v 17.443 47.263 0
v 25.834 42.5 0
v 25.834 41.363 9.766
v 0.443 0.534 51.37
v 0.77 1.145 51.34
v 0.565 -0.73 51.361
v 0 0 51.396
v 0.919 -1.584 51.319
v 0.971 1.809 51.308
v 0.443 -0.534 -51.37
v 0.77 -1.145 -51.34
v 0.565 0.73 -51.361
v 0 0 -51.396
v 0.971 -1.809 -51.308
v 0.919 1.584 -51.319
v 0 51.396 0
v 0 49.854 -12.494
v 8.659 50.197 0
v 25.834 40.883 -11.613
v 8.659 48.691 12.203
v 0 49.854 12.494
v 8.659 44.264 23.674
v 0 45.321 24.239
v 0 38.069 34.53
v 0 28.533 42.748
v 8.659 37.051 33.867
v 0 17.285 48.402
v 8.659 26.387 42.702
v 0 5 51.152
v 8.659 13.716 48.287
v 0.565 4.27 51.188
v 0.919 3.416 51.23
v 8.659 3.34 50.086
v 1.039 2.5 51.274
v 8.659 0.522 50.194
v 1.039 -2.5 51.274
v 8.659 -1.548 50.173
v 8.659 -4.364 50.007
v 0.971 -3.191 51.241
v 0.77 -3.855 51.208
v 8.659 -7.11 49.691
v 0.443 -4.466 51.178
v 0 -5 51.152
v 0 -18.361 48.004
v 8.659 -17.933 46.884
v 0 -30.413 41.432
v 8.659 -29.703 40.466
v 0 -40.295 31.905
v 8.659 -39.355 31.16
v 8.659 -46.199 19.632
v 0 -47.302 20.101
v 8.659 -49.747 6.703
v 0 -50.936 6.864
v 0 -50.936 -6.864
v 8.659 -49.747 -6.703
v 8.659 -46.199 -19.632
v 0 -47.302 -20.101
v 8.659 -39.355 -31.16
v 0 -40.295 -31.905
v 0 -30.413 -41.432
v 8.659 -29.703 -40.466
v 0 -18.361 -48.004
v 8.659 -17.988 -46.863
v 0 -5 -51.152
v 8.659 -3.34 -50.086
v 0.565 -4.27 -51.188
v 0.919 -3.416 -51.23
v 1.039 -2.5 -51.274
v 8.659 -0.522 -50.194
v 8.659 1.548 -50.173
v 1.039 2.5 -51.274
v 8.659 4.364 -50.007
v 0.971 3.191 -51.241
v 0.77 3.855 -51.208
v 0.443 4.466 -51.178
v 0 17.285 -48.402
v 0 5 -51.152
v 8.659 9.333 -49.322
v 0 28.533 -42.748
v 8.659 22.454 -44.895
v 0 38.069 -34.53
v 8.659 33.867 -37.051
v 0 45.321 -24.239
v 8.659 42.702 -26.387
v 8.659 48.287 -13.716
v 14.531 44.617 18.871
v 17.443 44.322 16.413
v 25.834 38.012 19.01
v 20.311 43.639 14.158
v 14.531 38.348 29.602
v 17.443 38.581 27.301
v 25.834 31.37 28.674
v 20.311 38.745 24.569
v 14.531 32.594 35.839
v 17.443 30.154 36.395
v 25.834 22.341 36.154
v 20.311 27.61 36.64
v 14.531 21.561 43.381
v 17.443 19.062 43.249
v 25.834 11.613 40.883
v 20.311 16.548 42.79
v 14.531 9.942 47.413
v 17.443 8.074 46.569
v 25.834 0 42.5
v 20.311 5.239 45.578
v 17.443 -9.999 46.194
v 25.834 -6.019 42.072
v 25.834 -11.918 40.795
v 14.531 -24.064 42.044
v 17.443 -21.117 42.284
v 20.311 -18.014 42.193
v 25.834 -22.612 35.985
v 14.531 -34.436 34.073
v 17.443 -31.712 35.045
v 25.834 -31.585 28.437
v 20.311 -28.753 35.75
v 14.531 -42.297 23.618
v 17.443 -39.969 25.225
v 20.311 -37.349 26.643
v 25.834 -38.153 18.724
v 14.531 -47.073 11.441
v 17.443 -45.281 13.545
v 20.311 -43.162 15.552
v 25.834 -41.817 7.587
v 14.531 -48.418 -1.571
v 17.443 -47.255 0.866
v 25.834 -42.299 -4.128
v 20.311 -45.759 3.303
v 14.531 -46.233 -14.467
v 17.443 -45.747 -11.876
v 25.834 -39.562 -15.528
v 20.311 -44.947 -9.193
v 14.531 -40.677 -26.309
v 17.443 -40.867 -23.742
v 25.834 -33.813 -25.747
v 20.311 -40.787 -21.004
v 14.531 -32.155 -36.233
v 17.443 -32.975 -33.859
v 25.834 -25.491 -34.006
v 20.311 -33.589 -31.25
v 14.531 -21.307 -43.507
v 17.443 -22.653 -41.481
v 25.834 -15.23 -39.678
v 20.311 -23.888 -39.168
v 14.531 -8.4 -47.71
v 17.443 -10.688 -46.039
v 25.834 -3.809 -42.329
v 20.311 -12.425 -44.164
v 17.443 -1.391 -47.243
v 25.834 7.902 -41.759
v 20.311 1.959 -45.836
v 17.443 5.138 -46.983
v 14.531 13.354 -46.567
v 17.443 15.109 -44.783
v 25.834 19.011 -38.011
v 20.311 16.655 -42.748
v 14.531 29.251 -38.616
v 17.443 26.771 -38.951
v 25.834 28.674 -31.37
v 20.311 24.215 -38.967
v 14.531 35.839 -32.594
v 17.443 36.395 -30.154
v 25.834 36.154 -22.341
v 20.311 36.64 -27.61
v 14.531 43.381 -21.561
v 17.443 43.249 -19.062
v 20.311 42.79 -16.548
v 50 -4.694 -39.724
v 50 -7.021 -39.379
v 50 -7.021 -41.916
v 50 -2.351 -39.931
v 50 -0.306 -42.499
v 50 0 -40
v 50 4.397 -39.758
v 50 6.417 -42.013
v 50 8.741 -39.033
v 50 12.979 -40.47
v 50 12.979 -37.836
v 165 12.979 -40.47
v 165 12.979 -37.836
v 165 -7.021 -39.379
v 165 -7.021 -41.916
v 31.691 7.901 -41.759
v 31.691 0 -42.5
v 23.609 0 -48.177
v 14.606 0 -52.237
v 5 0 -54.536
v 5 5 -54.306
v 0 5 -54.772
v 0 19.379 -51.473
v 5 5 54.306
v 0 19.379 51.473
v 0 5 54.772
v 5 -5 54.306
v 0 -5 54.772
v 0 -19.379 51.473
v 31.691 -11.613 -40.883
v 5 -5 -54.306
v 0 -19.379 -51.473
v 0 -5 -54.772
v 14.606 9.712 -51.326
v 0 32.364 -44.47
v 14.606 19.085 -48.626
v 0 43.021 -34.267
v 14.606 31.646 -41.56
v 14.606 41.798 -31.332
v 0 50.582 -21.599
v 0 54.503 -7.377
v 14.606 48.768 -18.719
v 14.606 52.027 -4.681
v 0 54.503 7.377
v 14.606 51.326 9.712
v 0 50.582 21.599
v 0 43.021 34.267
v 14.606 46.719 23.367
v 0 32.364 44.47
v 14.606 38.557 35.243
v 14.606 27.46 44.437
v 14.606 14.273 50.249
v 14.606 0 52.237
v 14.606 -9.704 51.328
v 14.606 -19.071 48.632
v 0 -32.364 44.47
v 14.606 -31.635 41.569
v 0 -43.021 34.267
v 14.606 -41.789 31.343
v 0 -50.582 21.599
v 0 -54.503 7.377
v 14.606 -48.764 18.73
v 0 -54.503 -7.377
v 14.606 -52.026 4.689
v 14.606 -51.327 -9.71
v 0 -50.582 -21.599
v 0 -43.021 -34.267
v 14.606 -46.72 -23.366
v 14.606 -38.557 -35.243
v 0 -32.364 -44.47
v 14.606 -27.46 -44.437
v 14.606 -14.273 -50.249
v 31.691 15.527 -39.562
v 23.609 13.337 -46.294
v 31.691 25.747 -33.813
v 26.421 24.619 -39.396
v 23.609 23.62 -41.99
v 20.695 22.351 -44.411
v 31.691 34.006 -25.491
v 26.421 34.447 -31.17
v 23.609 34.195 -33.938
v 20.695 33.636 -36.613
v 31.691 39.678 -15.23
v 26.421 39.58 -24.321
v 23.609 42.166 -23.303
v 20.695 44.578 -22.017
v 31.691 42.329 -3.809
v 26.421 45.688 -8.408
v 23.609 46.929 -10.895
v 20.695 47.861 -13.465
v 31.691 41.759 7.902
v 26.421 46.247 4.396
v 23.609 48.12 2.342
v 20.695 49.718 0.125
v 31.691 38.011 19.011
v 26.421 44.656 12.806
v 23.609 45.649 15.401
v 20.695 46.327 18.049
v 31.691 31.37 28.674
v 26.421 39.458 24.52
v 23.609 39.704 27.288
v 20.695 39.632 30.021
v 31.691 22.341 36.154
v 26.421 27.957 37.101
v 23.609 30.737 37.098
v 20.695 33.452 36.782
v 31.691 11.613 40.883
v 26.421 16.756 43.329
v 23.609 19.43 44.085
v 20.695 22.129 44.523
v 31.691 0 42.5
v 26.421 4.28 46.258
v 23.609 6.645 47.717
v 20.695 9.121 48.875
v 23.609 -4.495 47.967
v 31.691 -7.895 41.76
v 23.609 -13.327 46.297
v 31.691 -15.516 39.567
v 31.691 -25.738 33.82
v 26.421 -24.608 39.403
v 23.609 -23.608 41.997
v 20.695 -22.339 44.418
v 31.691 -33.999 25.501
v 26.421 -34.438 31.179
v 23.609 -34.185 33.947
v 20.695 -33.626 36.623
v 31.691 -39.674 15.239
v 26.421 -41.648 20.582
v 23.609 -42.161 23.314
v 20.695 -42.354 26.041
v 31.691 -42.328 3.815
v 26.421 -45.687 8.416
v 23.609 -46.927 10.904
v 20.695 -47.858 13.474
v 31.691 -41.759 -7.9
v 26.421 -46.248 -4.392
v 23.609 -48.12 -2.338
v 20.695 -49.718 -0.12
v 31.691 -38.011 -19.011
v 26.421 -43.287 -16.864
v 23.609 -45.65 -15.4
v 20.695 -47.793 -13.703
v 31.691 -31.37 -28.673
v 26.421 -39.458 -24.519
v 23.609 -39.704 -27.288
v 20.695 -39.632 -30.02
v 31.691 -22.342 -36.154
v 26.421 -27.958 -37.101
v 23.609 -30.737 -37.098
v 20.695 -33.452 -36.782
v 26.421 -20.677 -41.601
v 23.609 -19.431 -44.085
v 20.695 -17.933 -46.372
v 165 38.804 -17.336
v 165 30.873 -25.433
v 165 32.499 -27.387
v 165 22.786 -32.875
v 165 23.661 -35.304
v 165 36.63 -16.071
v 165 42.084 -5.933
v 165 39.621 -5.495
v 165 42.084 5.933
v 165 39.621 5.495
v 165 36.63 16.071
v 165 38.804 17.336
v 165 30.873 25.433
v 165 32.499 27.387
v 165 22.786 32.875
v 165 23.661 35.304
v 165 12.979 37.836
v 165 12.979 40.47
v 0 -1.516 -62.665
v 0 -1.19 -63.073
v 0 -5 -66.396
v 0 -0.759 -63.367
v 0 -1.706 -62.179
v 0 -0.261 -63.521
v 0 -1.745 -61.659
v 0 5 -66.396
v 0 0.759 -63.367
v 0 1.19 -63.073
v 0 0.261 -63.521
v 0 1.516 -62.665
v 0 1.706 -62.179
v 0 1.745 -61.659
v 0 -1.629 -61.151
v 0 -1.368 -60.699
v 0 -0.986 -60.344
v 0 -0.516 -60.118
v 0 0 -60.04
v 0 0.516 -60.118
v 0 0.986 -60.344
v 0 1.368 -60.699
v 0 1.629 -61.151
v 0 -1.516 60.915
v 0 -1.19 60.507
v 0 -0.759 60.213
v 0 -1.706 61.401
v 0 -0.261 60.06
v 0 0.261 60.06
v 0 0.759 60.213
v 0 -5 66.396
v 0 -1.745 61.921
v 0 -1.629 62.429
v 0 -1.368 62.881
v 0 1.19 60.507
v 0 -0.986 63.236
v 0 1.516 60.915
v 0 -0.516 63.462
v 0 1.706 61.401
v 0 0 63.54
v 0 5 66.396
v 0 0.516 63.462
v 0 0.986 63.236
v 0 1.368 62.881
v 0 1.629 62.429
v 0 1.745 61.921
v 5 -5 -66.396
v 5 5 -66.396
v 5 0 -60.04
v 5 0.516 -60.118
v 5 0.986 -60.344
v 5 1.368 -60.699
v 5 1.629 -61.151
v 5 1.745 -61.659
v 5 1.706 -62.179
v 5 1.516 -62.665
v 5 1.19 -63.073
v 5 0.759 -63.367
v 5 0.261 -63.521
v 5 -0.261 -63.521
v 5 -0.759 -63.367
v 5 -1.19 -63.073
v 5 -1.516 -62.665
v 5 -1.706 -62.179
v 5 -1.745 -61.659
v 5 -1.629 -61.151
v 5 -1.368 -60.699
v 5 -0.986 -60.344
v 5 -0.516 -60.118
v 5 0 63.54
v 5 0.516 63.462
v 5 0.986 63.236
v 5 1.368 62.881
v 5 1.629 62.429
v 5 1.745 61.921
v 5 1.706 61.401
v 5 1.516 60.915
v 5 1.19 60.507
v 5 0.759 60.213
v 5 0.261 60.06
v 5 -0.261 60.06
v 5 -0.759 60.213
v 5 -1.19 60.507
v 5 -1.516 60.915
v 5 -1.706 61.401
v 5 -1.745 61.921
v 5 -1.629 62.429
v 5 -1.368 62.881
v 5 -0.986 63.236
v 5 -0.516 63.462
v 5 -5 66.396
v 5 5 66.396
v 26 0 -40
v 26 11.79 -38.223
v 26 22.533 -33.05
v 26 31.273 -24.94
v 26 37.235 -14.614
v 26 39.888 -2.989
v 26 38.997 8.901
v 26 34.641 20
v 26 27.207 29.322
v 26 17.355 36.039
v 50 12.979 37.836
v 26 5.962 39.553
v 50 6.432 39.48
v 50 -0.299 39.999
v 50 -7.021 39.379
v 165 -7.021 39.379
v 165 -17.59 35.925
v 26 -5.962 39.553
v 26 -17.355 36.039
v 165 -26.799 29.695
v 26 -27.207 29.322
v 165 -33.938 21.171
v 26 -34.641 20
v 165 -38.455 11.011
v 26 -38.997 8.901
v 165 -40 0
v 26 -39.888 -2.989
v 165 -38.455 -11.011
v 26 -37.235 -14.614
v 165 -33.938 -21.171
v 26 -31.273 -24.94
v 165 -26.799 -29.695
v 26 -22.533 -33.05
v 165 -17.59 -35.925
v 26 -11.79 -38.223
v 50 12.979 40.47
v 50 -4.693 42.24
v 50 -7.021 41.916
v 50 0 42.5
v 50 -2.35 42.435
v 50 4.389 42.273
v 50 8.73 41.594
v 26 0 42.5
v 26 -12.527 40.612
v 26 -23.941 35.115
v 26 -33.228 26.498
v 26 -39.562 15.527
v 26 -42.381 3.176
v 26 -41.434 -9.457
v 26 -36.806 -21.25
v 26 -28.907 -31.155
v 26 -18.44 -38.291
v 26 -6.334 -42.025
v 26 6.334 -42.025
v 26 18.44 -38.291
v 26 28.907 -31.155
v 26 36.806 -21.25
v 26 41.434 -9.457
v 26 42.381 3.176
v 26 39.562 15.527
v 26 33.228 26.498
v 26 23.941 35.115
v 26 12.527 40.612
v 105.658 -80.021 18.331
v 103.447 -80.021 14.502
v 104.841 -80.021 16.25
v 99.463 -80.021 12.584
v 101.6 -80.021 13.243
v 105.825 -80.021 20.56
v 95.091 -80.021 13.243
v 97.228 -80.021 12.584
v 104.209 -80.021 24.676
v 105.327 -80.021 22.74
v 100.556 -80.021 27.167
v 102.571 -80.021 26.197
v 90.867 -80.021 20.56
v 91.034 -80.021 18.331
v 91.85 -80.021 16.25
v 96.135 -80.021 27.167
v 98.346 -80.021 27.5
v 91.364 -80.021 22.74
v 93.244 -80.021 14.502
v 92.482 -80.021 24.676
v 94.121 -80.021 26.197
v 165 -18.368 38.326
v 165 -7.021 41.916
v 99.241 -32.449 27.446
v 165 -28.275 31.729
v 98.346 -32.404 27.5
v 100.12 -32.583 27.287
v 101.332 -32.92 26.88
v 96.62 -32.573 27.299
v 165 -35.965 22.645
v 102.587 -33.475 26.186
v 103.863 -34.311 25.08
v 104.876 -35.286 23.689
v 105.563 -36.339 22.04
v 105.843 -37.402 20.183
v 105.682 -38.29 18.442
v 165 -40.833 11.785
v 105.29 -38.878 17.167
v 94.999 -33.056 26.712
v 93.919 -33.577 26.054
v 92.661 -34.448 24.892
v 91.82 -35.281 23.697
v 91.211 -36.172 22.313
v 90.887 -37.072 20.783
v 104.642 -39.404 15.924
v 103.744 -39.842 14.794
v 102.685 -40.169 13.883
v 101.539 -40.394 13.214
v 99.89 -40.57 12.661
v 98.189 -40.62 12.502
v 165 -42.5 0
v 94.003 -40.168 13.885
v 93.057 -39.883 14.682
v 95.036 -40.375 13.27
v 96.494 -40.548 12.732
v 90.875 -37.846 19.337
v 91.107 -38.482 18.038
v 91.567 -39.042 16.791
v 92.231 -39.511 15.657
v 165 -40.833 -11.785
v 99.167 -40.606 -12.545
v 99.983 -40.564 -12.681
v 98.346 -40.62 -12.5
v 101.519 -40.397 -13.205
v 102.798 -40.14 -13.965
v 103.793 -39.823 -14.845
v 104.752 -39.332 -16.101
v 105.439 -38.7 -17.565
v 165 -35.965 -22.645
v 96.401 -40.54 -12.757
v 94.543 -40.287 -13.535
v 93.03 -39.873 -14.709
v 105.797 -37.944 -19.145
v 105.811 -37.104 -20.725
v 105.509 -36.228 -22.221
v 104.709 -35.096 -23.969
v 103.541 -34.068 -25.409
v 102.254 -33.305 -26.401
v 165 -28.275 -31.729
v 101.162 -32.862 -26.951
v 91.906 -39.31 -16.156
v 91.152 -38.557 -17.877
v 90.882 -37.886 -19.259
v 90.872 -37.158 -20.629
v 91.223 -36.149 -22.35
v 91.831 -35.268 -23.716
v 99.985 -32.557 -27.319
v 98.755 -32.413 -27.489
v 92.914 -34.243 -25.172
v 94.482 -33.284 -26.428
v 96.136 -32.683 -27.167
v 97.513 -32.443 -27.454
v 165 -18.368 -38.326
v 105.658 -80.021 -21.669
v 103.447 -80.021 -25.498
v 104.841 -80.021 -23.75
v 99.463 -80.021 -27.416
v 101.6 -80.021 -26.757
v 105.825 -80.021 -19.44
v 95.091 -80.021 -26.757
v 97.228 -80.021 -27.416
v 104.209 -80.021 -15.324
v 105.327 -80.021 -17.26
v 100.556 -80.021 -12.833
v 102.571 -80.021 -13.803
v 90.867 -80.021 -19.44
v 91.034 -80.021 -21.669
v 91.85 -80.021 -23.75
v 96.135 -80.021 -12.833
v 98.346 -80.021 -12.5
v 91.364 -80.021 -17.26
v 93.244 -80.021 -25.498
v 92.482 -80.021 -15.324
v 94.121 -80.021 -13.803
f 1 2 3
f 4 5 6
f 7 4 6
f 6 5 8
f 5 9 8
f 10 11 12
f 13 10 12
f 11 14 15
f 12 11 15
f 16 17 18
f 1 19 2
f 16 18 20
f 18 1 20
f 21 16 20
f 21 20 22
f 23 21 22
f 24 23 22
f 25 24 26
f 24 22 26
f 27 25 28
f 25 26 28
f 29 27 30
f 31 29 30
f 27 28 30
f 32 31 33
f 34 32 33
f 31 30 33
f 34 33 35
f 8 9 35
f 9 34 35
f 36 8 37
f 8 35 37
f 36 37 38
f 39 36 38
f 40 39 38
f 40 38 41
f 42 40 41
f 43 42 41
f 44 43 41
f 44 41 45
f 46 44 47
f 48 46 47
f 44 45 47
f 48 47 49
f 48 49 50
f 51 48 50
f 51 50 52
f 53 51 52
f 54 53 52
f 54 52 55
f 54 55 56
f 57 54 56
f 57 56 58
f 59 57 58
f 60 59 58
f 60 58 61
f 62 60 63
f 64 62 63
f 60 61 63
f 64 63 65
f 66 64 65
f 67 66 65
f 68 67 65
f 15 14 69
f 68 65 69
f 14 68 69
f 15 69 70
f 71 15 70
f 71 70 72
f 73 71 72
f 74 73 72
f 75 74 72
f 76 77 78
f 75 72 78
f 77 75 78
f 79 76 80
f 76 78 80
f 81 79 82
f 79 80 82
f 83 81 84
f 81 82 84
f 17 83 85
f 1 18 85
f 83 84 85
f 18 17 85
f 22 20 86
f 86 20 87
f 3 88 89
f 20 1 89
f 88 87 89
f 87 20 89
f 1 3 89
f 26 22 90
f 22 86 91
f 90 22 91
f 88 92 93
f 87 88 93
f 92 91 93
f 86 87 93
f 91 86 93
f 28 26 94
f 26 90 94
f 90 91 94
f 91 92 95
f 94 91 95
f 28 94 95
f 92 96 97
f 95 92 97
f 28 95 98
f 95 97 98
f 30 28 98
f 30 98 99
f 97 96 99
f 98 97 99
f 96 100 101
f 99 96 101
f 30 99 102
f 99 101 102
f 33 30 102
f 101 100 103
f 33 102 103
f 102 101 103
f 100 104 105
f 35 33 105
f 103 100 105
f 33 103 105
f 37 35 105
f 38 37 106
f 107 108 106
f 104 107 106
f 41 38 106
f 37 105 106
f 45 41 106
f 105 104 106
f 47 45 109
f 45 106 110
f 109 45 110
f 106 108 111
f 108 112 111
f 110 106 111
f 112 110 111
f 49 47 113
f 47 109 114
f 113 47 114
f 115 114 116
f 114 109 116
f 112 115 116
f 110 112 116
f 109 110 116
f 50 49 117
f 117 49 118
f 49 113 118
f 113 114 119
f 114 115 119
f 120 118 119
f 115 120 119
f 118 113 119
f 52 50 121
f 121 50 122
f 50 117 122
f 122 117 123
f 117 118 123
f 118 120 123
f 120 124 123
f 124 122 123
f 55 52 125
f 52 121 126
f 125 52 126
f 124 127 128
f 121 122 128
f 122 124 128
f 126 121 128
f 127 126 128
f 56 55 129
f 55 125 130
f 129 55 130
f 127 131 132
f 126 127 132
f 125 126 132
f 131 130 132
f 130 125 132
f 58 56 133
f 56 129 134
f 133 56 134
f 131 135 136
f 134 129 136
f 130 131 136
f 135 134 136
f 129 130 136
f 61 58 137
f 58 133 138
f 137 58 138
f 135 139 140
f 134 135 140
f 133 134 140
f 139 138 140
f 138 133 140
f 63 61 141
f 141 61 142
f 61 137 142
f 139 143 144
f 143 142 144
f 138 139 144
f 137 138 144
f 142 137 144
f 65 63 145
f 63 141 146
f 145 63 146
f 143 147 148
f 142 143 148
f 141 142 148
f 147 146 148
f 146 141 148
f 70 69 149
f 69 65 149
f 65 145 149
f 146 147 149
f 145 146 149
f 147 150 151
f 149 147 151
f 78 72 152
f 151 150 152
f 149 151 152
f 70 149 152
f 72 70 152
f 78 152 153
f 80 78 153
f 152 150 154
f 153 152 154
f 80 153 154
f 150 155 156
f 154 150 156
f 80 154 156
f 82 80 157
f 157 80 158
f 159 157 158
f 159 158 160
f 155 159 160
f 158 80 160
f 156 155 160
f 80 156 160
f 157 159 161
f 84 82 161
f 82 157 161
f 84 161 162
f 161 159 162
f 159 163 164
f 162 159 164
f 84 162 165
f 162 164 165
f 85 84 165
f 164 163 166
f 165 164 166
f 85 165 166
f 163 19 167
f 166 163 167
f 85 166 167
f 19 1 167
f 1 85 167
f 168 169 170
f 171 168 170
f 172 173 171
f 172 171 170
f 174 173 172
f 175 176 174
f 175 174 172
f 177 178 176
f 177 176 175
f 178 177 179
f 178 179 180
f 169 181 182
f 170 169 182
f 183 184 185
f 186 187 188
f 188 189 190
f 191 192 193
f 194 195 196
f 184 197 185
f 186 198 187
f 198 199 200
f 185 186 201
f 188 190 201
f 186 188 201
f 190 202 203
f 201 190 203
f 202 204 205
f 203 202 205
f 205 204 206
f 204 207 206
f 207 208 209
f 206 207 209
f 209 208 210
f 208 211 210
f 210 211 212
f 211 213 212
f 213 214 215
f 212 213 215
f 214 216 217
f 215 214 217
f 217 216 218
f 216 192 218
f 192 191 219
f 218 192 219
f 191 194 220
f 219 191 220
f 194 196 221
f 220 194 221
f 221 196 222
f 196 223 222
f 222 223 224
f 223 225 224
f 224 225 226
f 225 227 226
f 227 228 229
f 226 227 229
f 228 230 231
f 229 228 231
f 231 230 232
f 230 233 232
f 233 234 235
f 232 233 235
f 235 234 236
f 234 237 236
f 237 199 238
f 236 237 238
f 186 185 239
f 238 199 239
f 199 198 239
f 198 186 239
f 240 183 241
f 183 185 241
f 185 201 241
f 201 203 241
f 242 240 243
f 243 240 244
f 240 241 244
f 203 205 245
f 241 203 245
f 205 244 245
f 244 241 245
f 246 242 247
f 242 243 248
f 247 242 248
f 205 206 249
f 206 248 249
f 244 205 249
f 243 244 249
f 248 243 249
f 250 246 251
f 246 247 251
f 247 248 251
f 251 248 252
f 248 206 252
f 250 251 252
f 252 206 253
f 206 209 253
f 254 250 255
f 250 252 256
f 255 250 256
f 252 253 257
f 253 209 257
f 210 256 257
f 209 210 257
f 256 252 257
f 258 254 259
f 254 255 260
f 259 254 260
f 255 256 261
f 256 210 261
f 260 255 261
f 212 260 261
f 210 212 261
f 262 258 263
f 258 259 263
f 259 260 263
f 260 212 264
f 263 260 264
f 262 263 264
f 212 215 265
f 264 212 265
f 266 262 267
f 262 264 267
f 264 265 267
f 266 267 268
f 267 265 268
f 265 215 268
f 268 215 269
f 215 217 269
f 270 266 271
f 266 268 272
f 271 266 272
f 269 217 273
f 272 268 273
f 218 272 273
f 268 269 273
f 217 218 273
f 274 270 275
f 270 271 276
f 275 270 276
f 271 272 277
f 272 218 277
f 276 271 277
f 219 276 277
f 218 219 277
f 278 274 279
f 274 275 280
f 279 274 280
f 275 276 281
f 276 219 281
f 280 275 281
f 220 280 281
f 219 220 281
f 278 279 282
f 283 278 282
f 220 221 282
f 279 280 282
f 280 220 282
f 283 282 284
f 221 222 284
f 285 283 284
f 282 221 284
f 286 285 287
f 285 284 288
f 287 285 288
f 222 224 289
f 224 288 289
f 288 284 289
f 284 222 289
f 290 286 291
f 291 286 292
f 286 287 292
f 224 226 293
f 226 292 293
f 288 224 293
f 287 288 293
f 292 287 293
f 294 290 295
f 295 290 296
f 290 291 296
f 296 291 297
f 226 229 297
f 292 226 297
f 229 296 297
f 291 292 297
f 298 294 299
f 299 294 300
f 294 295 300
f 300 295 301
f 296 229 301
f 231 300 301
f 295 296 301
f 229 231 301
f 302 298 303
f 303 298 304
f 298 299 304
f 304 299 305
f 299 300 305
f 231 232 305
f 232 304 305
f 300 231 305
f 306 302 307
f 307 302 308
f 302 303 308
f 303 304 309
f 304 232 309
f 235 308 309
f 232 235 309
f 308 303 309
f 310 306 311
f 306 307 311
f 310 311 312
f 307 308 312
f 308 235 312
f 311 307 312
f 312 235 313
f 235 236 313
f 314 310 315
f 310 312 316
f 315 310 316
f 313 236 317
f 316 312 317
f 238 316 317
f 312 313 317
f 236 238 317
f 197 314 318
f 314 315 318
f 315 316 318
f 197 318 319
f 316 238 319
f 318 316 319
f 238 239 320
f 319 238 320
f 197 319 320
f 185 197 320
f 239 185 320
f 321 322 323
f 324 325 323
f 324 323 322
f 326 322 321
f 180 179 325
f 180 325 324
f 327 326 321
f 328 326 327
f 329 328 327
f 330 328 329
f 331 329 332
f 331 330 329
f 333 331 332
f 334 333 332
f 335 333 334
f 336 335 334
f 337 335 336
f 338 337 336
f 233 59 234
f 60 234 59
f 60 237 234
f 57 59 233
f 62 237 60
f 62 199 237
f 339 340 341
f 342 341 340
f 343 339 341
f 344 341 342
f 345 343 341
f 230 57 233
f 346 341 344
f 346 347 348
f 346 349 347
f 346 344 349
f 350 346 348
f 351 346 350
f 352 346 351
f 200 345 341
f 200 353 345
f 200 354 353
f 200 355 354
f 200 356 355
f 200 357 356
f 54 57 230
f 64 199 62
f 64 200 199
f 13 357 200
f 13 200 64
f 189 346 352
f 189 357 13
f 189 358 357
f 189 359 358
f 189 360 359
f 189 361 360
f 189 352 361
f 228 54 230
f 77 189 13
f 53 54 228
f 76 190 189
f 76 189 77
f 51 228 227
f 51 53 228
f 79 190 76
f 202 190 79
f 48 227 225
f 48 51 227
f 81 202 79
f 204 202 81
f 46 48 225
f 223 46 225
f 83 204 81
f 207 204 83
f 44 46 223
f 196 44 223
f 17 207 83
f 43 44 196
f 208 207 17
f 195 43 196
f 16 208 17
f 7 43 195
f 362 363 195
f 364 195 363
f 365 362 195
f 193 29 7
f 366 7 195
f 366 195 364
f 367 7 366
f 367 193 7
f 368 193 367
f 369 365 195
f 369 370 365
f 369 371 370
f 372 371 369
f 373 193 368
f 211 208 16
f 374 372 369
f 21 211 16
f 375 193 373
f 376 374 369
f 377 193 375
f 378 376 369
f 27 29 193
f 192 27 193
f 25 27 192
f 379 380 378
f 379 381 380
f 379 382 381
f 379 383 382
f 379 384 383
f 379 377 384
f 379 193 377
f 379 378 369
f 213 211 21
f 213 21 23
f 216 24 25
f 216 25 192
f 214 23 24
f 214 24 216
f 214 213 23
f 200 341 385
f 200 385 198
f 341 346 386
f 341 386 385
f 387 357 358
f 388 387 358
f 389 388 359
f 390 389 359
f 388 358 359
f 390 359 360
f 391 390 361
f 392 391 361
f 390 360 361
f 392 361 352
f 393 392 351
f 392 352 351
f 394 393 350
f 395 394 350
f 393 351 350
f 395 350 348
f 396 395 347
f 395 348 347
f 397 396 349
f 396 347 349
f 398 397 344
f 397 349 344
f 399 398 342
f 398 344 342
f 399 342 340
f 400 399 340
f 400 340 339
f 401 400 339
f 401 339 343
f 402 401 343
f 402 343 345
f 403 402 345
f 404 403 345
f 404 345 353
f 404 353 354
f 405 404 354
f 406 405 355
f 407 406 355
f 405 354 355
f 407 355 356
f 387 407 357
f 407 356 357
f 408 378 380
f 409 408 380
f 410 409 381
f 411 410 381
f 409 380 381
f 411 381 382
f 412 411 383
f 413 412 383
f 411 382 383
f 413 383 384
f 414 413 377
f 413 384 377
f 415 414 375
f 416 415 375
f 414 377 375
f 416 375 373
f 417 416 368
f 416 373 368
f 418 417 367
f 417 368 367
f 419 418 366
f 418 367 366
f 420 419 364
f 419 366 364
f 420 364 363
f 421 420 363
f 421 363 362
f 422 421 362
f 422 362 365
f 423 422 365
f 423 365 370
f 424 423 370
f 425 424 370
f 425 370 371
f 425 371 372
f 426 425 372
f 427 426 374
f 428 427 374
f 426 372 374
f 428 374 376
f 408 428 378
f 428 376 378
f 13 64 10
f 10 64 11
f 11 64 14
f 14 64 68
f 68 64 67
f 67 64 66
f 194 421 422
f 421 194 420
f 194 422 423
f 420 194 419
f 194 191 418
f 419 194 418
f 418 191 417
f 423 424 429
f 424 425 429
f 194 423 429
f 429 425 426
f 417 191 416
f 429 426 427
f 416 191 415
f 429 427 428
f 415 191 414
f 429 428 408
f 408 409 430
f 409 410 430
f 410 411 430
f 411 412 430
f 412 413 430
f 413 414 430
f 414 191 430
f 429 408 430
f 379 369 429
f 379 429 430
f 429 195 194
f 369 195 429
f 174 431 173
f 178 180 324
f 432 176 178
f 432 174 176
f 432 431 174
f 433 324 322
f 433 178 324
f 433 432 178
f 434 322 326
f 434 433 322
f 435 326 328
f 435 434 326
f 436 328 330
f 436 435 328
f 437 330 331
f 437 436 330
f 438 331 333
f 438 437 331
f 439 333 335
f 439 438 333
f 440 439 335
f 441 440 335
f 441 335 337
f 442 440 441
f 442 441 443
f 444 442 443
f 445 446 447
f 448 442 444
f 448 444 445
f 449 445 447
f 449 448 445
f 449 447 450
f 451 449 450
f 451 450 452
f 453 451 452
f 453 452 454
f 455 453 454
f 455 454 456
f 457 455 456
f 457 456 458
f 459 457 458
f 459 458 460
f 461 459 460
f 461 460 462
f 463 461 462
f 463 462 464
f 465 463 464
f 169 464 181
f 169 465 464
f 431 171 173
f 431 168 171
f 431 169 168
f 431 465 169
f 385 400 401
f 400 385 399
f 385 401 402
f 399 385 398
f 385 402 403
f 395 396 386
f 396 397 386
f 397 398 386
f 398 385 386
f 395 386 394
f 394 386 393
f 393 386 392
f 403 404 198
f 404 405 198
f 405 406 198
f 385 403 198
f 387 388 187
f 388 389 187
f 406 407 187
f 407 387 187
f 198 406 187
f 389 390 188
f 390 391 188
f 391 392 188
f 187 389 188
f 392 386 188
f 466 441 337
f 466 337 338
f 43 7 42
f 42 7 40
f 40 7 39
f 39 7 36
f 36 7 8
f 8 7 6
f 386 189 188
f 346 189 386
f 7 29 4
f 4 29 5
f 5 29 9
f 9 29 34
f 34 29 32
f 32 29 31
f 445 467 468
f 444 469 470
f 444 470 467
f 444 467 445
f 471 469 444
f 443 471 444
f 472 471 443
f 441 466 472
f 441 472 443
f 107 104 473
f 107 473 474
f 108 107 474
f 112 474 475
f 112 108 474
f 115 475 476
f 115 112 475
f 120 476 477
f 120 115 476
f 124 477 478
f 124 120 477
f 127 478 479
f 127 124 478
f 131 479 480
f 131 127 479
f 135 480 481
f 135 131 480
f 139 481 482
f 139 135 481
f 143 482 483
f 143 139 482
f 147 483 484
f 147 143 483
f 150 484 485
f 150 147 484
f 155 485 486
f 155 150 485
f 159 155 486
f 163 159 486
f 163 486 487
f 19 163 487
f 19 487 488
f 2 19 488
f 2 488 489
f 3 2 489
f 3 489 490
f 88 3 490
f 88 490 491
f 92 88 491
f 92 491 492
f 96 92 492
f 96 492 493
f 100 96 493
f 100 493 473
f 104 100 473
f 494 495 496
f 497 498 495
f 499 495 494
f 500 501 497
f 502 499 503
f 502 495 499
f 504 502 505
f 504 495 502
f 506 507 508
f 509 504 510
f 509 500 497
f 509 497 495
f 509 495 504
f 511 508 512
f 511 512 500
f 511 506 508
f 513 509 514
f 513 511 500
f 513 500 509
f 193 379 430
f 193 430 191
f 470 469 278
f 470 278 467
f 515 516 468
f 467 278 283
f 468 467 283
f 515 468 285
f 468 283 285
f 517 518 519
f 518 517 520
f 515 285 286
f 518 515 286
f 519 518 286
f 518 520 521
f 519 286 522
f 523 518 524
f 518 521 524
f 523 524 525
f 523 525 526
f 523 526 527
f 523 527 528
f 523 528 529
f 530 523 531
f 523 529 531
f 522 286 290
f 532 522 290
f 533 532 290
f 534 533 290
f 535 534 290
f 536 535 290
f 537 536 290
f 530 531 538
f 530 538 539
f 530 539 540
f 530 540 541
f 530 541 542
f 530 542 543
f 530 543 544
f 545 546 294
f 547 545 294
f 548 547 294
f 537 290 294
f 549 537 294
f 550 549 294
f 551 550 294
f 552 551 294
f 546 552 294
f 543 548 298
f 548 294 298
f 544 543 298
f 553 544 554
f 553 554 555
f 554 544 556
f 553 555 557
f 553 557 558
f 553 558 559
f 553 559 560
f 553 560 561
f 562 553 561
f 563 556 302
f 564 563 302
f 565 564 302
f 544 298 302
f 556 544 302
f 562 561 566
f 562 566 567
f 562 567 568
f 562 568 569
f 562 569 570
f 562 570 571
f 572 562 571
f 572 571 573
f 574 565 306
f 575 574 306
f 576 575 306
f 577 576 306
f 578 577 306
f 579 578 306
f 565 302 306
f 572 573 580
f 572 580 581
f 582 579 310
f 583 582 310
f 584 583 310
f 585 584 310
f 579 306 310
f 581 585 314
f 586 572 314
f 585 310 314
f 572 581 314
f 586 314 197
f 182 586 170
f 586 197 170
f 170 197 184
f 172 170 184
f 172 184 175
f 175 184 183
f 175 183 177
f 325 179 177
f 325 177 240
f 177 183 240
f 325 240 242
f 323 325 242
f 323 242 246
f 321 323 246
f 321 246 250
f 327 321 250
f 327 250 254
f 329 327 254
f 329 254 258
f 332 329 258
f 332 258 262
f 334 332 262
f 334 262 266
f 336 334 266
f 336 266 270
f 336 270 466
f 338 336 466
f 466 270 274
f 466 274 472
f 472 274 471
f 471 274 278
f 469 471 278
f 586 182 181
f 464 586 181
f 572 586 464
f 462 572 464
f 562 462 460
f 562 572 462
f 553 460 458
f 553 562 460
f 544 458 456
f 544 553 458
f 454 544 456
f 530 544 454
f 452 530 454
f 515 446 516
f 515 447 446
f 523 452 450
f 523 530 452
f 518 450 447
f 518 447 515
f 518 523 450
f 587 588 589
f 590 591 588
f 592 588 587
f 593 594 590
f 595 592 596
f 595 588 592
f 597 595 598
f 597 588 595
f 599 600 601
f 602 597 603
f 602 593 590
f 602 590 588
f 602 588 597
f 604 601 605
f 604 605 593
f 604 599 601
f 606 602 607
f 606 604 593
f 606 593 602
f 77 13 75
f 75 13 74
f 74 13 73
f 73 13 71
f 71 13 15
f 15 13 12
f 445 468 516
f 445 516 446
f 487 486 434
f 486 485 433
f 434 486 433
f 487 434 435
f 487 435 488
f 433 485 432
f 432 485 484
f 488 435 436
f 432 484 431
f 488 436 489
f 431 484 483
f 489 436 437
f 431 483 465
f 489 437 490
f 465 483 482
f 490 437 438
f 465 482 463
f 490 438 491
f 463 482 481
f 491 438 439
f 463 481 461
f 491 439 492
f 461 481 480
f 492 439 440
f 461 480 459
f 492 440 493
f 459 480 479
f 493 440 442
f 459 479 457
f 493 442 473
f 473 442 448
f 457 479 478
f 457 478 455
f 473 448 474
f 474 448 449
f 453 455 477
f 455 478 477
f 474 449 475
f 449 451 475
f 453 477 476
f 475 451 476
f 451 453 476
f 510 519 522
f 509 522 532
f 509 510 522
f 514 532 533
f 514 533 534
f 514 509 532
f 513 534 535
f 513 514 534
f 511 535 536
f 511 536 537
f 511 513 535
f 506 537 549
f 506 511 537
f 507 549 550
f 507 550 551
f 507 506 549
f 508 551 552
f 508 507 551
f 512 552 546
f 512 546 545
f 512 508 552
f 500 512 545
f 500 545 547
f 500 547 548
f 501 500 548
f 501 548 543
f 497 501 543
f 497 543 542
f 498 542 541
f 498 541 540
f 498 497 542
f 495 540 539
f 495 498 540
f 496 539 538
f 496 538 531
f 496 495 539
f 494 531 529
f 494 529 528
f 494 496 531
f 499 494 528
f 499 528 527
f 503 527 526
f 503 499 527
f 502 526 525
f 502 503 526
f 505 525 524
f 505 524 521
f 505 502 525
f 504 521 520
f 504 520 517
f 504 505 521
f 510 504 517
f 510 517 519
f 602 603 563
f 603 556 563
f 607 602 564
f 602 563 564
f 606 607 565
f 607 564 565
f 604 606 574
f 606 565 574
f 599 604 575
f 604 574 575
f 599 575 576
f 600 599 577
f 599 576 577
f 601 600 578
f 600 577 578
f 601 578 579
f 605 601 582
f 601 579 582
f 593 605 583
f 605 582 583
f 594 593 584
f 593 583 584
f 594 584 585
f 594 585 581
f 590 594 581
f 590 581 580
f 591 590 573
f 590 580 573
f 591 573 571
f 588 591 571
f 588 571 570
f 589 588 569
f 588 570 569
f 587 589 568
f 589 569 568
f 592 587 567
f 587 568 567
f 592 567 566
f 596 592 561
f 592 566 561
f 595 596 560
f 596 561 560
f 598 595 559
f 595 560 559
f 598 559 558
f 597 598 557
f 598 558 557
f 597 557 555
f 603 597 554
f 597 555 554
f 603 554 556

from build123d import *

# Parameters (mm, degrees)
CUT_EXTRUDE1_DEPTH              = 85
CUT_EXTRUDE1_DEPTH_BACK         = 30
SKETCH2_R                       = 42.5
BOSS_EXTRUDE1_DEPTH             = 135
BOSS_EXTRUDE1_DEPTH_BACK        = 4
SKETCH3_R                       = 42.5
SKETCH3_R_2                     = 40
CUT_EXTRUDE2_START              = -115
CUT_EXTRUDE2_DEPTH              = 115
BOSS_EXTRUDE3_REACH             = 208.879
BOSS_EXTRUDE3_END_RADIUS        = 42.5
SKETCH7_R                       = 7.5
BOSS_EXTRUDE3_DIRECTION_2_DEPTH = 23
SKETCH8_R                       = 1.75
BOSS_EXTRUDE4_DEPTH             = 5


# Read off the part's stored shape, not the designer's step: Shell1
with BuildPart() as part:
    # Sketch1 → Revolve1 (revolve)
    with BuildSketch(Plane(origin=(0, 0, 0), x_dir=(1, 0, 0), z_dir=(0, 1, 0))):
        with BuildLine():
            Line((0, 0), (50, 0))
            ThreePointArc((50, 0), (36.43816018, 37.898327436), (0, 55))
            Line((0, 55), (0, 0))
        make_face()
    revolve(axis=Axis((0, 0, 0), (1, 0, 0)))

    # Shell1 outline → Shell1 (revolve, cut)
    with BuildSketch(Plane.YX):
        with BuildLine():
            add(Edge.make_bspline(
                [(51.396143239, 0), (50.757559449, 13.308797838), (45.305252471, 29.157669604), (32.638691052, 41.565710517), (16.262834021, 46.466854434), (2.111028419, 46.466854274), (1.578625505, 46.459517426), (1.049215582, 46.444998454), (0.522958084, 46.423458206), (0, 46.395061716)],
                knots=[4.717788708, 4.717788708, 4.717788708, 4.717788708, 4.717788708, 4.717788708, 6.23524, 6.23524, 6.23524, 6.23524, 6.294886198, 6.294886198, 6.294886198, 6.294886198, 6.294886198, 6.294886198], degree=5, weights=[1, 1, 0.970217445, 0.968892719, 1, 1, 1.000000024, 1.000000027, 1, 1]))
            Line((0, 46.395061716), (0, 0))
            Line((0, 0), (51.396143239, 0))
        make_face()
    revolve(axis=Axis((0, 0, 0), (1, 0, 0)), mode=Mode.SUBTRACT)

    # Sketch2 → Cut-Extrude1 (cut, two sides: drawn at the far end of the back side and taken through both)
    with BuildSketch(Plane(origin=(30, 0, 0), x_dir=(0, 0, -1), z_dir=(1, 0, 0)).offset(-CUT_EXTRUDE1_DEPTH_BACK)):
        with Locations(Location((0, 0, 0), (0, 0, 180))):
            Circle(SKETCH2_R)
    extrude(amount=CUT_EXTRUDE1_DEPTH + CUT_EXTRUDE1_DEPTH_BACK, mode=Mode.SUBTRACT)

    # Sketch3 → Boss-Extrude1 (add, two sides: drawn at the far end of the back side and taken through both)
    with BuildSketch(Plane(origin=(30, 0, 0), x_dir=(0, 0, -1), z_dir=(1, 0, 0)).offset(-BOSS_EXTRUDE1_DEPTH_BACK)):
        with Locations(Location((0, 0, 0), (0, 0, 180))):
            Circle(SKETCH3_R)
        Circle(SKETCH3_R_2, mode=Mode.SUBTRACT)
    extrude(amount=BOSS_EXTRUDE1_DEPTH + BOSS_EXTRUDE1_DEPTH_BACK)

    # Sketch4 → Cut-Extrude2 (cut)
    with BuildSketch(Plane(origin=(165, 0, 0), x_dir=(0, 0, -1), z_dir=(1, 0, 0)).offset(CUT_EXTRUDE2_START)):
        with BuildLine():
            Line((45.575841937, 12.978925493), (40.46971081, 12.978925493))
            ThreePointArc((40.46971081, 12.978925493), (41.989360018, 6.568382243), (42.5, 0))
            ThreePointArc((42.5, 0), (42.353758703, -3.522658622), (41.916041234, -7.021074507))
            Line((41.916041234, -7.021074507), (45.575841937, -7.021074507))
            Line((45.575841937, -7.021074507), (45.575841937, 12.978925493))
        make_face()
        with BuildLine():
            ThreePointArc((40, 0), (39.455239564, 6.579063078), (37.835796451, 12.978925493))
            Line((37.835796451, 12.978925493), (35.575841937, 12.978925493))
            Line((35.575841937, 12.978925493), (35.575841937, 2.978925493))
            Line((35.575841937, 2.978925493), (35.575841937, -7.021074507))
            Line((35.575841937, -7.021074507), (39.378985675, -7.021074507))
            ThreePointArc((39.378985675, -7.021074507), (39.844443948, -3.524242686), (40, 0))
        make_face()
        with BuildLine():
            ThreePointArc((42.5, 0), (41.989360018, 6.568382243), (40.46971081, 12.978925493))
            Line((40.46971081, 12.978925493), (37.835796451, 12.978925493))
            ThreePointArc((37.835796451, 12.978925493), (39.455239564, 6.579063078), (40, 0))
            ThreePointArc((40, 0), (39.844443948, -3.524242686), (39.378985675, -7.021074507))
            Line((39.378985675, -7.021074507), (41.916041234, -7.021074507))
            ThreePointArc((41.916041234, -7.021074507), (42.353758703, -3.522658622), (42.5, 0))
        make_face()
        with BuildLine():
            Line((-37.835796451, 12.978925493), (-40.46971081, 12.978925493))
            ThreePointArc((-40.46971081, 12.978925493), (-42.389303309, 3.065446952), (-41.916041234, -7.021074507))
            Line((-41.916041234, -7.021074507), (-39.378985675, -7.021074507))
            ThreePointArc((-39.378985675, -7.021074507), (-39.881457404, 3.077231765), (-37.835796451, 12.978925493))
        make_face()
        with BuildLine():
            Line((-35.575841937, 12.978925493), (-37.835796451, 12.978925493))
            ThreePointArc((-37.835796451, 12.978925493), (-39.881457404, 3.077231765), (-39.378985675, -7.021074507))
            Line((-39.378985675, -7.021074507), (-35.575841937, -7.021074507))
            Line((-35.575841937, -7.021074507), (-35.575841937, 2.978925493))
            Line((-35.575841937, 2.978925493), (-35.575841937, 12.978925493))
        make_face()
    extrude(amount=CUT_EXTRUDE2_DEPTH, mode=Mode.SUBTRACT)

    # Boss-Extrude3: up to this cylinder (the profile starts outside it)
    boss_extrude3_end = Plane(origin=(98.345618, 0, 0), z_dir=(-1, 0, 0)) * Cylinder(BOSS_EXTRUDE3_END_RADIUS, 503.758, mode=Mode.PRIVATE)
    # Sketch7 → Boss-Extrude3 (add, up to the surface)
    with BuildSketch(Plane(origin=(0, -57.021074507, 0), x_dir=(-1, 0, 0), z_dir=(0, -1, 0)), mode=Mode.PRIVATE) as boss_extrude3_sk1:
        with Locations(Location((-98.345617605, 20, 0), (0, 0, 270))):
            Circle(SKETCH7_R)
    boss_extrude3_tool1 = extrude(boss_extrude3_sk1.sketch, amount=-BOSS_EXTRUDE3_REACH, mode=Mode.PRIVATE) - boss_extrude3_end
    add(boss_extrude3_tool1.solids().sort_by_distance((98.345618, -57.021075, -20))[0])
    # Sketch7 → Boss-Extrude3 (add, up to the surface)
    with BuildSketch(Plane(origin=(0, -57.021074507, 0), x_dir=(-1, 0, 0), z_dir=(0, -1, 0)), mode=Mode.PRIVATE) as boss_extrude3_sk2:
        with Locations(Location((-98.345617605, -20, 0), (0, 0, 270))):
            Circle(SKETCH7_R)
    boss_extrude3_tool2 = extrude(boss_extrude3_sk2.sketch, amount=-BOSS_EXTRUDE3_REACH, mode=Mode.PRIVATE) - boss_extrude3_end
    add(boss_extrude3_tool2.solids().sort_by_distance((98.345618, -57.021075, 20))[0])

    # Sketch7 → Boss-Extrude3 direction 2 (add)
    with BuildSketch(Plane(origin=(0, -57.021074507, 0), x_dir=(-1, 0, 0), z_dir=(0, -1, 0))):
        with Locations(Location((-98.345617605, 20, 0), (0, 0, 270))):
            Circle(SKETCH7_R)
        with Locations(Location((-98.345617605, -20, 0), (0, 0, 270))):
            Circle(SKETCH7_R)
    extrude(amount=BOSS_EXTRUDE3_DIRECTION_2_DEPTH)

    # Sketch8 → Boss-Extrude4 (add)
    # profile 1 of 2: a face of its own
    with BuildSketch(Plane.ZY):
        Polygon((66.396143239, 0), (66.396143239, 5), (51.152356151, 5), (51.396143239, 0), (51.152356151, -5), (66.396143239, -5), align=None)
        with Locations((61.79005008, 0)):
            Circle(SKETCH8_R, mode=Mode.SUBTRACT)
    # profile 2 of 2: a face of its own
    with BuildSketch(Plane.ZY):
        Polygon((-51.152356151, -5), (-51.396143239, 0), (-51.152356151, 5), (-66.396143239, 5), (-66.396143239, 0), (-66.396143239, -5), align=None)
        with Locations((-61.79005008, 0)):
            Circle(SKETCH8_R, mode=Mode.SUBTRACT)
    extrude(amount=-BOSS_EXTRUDE4_DEPTH)


solid = part.part
